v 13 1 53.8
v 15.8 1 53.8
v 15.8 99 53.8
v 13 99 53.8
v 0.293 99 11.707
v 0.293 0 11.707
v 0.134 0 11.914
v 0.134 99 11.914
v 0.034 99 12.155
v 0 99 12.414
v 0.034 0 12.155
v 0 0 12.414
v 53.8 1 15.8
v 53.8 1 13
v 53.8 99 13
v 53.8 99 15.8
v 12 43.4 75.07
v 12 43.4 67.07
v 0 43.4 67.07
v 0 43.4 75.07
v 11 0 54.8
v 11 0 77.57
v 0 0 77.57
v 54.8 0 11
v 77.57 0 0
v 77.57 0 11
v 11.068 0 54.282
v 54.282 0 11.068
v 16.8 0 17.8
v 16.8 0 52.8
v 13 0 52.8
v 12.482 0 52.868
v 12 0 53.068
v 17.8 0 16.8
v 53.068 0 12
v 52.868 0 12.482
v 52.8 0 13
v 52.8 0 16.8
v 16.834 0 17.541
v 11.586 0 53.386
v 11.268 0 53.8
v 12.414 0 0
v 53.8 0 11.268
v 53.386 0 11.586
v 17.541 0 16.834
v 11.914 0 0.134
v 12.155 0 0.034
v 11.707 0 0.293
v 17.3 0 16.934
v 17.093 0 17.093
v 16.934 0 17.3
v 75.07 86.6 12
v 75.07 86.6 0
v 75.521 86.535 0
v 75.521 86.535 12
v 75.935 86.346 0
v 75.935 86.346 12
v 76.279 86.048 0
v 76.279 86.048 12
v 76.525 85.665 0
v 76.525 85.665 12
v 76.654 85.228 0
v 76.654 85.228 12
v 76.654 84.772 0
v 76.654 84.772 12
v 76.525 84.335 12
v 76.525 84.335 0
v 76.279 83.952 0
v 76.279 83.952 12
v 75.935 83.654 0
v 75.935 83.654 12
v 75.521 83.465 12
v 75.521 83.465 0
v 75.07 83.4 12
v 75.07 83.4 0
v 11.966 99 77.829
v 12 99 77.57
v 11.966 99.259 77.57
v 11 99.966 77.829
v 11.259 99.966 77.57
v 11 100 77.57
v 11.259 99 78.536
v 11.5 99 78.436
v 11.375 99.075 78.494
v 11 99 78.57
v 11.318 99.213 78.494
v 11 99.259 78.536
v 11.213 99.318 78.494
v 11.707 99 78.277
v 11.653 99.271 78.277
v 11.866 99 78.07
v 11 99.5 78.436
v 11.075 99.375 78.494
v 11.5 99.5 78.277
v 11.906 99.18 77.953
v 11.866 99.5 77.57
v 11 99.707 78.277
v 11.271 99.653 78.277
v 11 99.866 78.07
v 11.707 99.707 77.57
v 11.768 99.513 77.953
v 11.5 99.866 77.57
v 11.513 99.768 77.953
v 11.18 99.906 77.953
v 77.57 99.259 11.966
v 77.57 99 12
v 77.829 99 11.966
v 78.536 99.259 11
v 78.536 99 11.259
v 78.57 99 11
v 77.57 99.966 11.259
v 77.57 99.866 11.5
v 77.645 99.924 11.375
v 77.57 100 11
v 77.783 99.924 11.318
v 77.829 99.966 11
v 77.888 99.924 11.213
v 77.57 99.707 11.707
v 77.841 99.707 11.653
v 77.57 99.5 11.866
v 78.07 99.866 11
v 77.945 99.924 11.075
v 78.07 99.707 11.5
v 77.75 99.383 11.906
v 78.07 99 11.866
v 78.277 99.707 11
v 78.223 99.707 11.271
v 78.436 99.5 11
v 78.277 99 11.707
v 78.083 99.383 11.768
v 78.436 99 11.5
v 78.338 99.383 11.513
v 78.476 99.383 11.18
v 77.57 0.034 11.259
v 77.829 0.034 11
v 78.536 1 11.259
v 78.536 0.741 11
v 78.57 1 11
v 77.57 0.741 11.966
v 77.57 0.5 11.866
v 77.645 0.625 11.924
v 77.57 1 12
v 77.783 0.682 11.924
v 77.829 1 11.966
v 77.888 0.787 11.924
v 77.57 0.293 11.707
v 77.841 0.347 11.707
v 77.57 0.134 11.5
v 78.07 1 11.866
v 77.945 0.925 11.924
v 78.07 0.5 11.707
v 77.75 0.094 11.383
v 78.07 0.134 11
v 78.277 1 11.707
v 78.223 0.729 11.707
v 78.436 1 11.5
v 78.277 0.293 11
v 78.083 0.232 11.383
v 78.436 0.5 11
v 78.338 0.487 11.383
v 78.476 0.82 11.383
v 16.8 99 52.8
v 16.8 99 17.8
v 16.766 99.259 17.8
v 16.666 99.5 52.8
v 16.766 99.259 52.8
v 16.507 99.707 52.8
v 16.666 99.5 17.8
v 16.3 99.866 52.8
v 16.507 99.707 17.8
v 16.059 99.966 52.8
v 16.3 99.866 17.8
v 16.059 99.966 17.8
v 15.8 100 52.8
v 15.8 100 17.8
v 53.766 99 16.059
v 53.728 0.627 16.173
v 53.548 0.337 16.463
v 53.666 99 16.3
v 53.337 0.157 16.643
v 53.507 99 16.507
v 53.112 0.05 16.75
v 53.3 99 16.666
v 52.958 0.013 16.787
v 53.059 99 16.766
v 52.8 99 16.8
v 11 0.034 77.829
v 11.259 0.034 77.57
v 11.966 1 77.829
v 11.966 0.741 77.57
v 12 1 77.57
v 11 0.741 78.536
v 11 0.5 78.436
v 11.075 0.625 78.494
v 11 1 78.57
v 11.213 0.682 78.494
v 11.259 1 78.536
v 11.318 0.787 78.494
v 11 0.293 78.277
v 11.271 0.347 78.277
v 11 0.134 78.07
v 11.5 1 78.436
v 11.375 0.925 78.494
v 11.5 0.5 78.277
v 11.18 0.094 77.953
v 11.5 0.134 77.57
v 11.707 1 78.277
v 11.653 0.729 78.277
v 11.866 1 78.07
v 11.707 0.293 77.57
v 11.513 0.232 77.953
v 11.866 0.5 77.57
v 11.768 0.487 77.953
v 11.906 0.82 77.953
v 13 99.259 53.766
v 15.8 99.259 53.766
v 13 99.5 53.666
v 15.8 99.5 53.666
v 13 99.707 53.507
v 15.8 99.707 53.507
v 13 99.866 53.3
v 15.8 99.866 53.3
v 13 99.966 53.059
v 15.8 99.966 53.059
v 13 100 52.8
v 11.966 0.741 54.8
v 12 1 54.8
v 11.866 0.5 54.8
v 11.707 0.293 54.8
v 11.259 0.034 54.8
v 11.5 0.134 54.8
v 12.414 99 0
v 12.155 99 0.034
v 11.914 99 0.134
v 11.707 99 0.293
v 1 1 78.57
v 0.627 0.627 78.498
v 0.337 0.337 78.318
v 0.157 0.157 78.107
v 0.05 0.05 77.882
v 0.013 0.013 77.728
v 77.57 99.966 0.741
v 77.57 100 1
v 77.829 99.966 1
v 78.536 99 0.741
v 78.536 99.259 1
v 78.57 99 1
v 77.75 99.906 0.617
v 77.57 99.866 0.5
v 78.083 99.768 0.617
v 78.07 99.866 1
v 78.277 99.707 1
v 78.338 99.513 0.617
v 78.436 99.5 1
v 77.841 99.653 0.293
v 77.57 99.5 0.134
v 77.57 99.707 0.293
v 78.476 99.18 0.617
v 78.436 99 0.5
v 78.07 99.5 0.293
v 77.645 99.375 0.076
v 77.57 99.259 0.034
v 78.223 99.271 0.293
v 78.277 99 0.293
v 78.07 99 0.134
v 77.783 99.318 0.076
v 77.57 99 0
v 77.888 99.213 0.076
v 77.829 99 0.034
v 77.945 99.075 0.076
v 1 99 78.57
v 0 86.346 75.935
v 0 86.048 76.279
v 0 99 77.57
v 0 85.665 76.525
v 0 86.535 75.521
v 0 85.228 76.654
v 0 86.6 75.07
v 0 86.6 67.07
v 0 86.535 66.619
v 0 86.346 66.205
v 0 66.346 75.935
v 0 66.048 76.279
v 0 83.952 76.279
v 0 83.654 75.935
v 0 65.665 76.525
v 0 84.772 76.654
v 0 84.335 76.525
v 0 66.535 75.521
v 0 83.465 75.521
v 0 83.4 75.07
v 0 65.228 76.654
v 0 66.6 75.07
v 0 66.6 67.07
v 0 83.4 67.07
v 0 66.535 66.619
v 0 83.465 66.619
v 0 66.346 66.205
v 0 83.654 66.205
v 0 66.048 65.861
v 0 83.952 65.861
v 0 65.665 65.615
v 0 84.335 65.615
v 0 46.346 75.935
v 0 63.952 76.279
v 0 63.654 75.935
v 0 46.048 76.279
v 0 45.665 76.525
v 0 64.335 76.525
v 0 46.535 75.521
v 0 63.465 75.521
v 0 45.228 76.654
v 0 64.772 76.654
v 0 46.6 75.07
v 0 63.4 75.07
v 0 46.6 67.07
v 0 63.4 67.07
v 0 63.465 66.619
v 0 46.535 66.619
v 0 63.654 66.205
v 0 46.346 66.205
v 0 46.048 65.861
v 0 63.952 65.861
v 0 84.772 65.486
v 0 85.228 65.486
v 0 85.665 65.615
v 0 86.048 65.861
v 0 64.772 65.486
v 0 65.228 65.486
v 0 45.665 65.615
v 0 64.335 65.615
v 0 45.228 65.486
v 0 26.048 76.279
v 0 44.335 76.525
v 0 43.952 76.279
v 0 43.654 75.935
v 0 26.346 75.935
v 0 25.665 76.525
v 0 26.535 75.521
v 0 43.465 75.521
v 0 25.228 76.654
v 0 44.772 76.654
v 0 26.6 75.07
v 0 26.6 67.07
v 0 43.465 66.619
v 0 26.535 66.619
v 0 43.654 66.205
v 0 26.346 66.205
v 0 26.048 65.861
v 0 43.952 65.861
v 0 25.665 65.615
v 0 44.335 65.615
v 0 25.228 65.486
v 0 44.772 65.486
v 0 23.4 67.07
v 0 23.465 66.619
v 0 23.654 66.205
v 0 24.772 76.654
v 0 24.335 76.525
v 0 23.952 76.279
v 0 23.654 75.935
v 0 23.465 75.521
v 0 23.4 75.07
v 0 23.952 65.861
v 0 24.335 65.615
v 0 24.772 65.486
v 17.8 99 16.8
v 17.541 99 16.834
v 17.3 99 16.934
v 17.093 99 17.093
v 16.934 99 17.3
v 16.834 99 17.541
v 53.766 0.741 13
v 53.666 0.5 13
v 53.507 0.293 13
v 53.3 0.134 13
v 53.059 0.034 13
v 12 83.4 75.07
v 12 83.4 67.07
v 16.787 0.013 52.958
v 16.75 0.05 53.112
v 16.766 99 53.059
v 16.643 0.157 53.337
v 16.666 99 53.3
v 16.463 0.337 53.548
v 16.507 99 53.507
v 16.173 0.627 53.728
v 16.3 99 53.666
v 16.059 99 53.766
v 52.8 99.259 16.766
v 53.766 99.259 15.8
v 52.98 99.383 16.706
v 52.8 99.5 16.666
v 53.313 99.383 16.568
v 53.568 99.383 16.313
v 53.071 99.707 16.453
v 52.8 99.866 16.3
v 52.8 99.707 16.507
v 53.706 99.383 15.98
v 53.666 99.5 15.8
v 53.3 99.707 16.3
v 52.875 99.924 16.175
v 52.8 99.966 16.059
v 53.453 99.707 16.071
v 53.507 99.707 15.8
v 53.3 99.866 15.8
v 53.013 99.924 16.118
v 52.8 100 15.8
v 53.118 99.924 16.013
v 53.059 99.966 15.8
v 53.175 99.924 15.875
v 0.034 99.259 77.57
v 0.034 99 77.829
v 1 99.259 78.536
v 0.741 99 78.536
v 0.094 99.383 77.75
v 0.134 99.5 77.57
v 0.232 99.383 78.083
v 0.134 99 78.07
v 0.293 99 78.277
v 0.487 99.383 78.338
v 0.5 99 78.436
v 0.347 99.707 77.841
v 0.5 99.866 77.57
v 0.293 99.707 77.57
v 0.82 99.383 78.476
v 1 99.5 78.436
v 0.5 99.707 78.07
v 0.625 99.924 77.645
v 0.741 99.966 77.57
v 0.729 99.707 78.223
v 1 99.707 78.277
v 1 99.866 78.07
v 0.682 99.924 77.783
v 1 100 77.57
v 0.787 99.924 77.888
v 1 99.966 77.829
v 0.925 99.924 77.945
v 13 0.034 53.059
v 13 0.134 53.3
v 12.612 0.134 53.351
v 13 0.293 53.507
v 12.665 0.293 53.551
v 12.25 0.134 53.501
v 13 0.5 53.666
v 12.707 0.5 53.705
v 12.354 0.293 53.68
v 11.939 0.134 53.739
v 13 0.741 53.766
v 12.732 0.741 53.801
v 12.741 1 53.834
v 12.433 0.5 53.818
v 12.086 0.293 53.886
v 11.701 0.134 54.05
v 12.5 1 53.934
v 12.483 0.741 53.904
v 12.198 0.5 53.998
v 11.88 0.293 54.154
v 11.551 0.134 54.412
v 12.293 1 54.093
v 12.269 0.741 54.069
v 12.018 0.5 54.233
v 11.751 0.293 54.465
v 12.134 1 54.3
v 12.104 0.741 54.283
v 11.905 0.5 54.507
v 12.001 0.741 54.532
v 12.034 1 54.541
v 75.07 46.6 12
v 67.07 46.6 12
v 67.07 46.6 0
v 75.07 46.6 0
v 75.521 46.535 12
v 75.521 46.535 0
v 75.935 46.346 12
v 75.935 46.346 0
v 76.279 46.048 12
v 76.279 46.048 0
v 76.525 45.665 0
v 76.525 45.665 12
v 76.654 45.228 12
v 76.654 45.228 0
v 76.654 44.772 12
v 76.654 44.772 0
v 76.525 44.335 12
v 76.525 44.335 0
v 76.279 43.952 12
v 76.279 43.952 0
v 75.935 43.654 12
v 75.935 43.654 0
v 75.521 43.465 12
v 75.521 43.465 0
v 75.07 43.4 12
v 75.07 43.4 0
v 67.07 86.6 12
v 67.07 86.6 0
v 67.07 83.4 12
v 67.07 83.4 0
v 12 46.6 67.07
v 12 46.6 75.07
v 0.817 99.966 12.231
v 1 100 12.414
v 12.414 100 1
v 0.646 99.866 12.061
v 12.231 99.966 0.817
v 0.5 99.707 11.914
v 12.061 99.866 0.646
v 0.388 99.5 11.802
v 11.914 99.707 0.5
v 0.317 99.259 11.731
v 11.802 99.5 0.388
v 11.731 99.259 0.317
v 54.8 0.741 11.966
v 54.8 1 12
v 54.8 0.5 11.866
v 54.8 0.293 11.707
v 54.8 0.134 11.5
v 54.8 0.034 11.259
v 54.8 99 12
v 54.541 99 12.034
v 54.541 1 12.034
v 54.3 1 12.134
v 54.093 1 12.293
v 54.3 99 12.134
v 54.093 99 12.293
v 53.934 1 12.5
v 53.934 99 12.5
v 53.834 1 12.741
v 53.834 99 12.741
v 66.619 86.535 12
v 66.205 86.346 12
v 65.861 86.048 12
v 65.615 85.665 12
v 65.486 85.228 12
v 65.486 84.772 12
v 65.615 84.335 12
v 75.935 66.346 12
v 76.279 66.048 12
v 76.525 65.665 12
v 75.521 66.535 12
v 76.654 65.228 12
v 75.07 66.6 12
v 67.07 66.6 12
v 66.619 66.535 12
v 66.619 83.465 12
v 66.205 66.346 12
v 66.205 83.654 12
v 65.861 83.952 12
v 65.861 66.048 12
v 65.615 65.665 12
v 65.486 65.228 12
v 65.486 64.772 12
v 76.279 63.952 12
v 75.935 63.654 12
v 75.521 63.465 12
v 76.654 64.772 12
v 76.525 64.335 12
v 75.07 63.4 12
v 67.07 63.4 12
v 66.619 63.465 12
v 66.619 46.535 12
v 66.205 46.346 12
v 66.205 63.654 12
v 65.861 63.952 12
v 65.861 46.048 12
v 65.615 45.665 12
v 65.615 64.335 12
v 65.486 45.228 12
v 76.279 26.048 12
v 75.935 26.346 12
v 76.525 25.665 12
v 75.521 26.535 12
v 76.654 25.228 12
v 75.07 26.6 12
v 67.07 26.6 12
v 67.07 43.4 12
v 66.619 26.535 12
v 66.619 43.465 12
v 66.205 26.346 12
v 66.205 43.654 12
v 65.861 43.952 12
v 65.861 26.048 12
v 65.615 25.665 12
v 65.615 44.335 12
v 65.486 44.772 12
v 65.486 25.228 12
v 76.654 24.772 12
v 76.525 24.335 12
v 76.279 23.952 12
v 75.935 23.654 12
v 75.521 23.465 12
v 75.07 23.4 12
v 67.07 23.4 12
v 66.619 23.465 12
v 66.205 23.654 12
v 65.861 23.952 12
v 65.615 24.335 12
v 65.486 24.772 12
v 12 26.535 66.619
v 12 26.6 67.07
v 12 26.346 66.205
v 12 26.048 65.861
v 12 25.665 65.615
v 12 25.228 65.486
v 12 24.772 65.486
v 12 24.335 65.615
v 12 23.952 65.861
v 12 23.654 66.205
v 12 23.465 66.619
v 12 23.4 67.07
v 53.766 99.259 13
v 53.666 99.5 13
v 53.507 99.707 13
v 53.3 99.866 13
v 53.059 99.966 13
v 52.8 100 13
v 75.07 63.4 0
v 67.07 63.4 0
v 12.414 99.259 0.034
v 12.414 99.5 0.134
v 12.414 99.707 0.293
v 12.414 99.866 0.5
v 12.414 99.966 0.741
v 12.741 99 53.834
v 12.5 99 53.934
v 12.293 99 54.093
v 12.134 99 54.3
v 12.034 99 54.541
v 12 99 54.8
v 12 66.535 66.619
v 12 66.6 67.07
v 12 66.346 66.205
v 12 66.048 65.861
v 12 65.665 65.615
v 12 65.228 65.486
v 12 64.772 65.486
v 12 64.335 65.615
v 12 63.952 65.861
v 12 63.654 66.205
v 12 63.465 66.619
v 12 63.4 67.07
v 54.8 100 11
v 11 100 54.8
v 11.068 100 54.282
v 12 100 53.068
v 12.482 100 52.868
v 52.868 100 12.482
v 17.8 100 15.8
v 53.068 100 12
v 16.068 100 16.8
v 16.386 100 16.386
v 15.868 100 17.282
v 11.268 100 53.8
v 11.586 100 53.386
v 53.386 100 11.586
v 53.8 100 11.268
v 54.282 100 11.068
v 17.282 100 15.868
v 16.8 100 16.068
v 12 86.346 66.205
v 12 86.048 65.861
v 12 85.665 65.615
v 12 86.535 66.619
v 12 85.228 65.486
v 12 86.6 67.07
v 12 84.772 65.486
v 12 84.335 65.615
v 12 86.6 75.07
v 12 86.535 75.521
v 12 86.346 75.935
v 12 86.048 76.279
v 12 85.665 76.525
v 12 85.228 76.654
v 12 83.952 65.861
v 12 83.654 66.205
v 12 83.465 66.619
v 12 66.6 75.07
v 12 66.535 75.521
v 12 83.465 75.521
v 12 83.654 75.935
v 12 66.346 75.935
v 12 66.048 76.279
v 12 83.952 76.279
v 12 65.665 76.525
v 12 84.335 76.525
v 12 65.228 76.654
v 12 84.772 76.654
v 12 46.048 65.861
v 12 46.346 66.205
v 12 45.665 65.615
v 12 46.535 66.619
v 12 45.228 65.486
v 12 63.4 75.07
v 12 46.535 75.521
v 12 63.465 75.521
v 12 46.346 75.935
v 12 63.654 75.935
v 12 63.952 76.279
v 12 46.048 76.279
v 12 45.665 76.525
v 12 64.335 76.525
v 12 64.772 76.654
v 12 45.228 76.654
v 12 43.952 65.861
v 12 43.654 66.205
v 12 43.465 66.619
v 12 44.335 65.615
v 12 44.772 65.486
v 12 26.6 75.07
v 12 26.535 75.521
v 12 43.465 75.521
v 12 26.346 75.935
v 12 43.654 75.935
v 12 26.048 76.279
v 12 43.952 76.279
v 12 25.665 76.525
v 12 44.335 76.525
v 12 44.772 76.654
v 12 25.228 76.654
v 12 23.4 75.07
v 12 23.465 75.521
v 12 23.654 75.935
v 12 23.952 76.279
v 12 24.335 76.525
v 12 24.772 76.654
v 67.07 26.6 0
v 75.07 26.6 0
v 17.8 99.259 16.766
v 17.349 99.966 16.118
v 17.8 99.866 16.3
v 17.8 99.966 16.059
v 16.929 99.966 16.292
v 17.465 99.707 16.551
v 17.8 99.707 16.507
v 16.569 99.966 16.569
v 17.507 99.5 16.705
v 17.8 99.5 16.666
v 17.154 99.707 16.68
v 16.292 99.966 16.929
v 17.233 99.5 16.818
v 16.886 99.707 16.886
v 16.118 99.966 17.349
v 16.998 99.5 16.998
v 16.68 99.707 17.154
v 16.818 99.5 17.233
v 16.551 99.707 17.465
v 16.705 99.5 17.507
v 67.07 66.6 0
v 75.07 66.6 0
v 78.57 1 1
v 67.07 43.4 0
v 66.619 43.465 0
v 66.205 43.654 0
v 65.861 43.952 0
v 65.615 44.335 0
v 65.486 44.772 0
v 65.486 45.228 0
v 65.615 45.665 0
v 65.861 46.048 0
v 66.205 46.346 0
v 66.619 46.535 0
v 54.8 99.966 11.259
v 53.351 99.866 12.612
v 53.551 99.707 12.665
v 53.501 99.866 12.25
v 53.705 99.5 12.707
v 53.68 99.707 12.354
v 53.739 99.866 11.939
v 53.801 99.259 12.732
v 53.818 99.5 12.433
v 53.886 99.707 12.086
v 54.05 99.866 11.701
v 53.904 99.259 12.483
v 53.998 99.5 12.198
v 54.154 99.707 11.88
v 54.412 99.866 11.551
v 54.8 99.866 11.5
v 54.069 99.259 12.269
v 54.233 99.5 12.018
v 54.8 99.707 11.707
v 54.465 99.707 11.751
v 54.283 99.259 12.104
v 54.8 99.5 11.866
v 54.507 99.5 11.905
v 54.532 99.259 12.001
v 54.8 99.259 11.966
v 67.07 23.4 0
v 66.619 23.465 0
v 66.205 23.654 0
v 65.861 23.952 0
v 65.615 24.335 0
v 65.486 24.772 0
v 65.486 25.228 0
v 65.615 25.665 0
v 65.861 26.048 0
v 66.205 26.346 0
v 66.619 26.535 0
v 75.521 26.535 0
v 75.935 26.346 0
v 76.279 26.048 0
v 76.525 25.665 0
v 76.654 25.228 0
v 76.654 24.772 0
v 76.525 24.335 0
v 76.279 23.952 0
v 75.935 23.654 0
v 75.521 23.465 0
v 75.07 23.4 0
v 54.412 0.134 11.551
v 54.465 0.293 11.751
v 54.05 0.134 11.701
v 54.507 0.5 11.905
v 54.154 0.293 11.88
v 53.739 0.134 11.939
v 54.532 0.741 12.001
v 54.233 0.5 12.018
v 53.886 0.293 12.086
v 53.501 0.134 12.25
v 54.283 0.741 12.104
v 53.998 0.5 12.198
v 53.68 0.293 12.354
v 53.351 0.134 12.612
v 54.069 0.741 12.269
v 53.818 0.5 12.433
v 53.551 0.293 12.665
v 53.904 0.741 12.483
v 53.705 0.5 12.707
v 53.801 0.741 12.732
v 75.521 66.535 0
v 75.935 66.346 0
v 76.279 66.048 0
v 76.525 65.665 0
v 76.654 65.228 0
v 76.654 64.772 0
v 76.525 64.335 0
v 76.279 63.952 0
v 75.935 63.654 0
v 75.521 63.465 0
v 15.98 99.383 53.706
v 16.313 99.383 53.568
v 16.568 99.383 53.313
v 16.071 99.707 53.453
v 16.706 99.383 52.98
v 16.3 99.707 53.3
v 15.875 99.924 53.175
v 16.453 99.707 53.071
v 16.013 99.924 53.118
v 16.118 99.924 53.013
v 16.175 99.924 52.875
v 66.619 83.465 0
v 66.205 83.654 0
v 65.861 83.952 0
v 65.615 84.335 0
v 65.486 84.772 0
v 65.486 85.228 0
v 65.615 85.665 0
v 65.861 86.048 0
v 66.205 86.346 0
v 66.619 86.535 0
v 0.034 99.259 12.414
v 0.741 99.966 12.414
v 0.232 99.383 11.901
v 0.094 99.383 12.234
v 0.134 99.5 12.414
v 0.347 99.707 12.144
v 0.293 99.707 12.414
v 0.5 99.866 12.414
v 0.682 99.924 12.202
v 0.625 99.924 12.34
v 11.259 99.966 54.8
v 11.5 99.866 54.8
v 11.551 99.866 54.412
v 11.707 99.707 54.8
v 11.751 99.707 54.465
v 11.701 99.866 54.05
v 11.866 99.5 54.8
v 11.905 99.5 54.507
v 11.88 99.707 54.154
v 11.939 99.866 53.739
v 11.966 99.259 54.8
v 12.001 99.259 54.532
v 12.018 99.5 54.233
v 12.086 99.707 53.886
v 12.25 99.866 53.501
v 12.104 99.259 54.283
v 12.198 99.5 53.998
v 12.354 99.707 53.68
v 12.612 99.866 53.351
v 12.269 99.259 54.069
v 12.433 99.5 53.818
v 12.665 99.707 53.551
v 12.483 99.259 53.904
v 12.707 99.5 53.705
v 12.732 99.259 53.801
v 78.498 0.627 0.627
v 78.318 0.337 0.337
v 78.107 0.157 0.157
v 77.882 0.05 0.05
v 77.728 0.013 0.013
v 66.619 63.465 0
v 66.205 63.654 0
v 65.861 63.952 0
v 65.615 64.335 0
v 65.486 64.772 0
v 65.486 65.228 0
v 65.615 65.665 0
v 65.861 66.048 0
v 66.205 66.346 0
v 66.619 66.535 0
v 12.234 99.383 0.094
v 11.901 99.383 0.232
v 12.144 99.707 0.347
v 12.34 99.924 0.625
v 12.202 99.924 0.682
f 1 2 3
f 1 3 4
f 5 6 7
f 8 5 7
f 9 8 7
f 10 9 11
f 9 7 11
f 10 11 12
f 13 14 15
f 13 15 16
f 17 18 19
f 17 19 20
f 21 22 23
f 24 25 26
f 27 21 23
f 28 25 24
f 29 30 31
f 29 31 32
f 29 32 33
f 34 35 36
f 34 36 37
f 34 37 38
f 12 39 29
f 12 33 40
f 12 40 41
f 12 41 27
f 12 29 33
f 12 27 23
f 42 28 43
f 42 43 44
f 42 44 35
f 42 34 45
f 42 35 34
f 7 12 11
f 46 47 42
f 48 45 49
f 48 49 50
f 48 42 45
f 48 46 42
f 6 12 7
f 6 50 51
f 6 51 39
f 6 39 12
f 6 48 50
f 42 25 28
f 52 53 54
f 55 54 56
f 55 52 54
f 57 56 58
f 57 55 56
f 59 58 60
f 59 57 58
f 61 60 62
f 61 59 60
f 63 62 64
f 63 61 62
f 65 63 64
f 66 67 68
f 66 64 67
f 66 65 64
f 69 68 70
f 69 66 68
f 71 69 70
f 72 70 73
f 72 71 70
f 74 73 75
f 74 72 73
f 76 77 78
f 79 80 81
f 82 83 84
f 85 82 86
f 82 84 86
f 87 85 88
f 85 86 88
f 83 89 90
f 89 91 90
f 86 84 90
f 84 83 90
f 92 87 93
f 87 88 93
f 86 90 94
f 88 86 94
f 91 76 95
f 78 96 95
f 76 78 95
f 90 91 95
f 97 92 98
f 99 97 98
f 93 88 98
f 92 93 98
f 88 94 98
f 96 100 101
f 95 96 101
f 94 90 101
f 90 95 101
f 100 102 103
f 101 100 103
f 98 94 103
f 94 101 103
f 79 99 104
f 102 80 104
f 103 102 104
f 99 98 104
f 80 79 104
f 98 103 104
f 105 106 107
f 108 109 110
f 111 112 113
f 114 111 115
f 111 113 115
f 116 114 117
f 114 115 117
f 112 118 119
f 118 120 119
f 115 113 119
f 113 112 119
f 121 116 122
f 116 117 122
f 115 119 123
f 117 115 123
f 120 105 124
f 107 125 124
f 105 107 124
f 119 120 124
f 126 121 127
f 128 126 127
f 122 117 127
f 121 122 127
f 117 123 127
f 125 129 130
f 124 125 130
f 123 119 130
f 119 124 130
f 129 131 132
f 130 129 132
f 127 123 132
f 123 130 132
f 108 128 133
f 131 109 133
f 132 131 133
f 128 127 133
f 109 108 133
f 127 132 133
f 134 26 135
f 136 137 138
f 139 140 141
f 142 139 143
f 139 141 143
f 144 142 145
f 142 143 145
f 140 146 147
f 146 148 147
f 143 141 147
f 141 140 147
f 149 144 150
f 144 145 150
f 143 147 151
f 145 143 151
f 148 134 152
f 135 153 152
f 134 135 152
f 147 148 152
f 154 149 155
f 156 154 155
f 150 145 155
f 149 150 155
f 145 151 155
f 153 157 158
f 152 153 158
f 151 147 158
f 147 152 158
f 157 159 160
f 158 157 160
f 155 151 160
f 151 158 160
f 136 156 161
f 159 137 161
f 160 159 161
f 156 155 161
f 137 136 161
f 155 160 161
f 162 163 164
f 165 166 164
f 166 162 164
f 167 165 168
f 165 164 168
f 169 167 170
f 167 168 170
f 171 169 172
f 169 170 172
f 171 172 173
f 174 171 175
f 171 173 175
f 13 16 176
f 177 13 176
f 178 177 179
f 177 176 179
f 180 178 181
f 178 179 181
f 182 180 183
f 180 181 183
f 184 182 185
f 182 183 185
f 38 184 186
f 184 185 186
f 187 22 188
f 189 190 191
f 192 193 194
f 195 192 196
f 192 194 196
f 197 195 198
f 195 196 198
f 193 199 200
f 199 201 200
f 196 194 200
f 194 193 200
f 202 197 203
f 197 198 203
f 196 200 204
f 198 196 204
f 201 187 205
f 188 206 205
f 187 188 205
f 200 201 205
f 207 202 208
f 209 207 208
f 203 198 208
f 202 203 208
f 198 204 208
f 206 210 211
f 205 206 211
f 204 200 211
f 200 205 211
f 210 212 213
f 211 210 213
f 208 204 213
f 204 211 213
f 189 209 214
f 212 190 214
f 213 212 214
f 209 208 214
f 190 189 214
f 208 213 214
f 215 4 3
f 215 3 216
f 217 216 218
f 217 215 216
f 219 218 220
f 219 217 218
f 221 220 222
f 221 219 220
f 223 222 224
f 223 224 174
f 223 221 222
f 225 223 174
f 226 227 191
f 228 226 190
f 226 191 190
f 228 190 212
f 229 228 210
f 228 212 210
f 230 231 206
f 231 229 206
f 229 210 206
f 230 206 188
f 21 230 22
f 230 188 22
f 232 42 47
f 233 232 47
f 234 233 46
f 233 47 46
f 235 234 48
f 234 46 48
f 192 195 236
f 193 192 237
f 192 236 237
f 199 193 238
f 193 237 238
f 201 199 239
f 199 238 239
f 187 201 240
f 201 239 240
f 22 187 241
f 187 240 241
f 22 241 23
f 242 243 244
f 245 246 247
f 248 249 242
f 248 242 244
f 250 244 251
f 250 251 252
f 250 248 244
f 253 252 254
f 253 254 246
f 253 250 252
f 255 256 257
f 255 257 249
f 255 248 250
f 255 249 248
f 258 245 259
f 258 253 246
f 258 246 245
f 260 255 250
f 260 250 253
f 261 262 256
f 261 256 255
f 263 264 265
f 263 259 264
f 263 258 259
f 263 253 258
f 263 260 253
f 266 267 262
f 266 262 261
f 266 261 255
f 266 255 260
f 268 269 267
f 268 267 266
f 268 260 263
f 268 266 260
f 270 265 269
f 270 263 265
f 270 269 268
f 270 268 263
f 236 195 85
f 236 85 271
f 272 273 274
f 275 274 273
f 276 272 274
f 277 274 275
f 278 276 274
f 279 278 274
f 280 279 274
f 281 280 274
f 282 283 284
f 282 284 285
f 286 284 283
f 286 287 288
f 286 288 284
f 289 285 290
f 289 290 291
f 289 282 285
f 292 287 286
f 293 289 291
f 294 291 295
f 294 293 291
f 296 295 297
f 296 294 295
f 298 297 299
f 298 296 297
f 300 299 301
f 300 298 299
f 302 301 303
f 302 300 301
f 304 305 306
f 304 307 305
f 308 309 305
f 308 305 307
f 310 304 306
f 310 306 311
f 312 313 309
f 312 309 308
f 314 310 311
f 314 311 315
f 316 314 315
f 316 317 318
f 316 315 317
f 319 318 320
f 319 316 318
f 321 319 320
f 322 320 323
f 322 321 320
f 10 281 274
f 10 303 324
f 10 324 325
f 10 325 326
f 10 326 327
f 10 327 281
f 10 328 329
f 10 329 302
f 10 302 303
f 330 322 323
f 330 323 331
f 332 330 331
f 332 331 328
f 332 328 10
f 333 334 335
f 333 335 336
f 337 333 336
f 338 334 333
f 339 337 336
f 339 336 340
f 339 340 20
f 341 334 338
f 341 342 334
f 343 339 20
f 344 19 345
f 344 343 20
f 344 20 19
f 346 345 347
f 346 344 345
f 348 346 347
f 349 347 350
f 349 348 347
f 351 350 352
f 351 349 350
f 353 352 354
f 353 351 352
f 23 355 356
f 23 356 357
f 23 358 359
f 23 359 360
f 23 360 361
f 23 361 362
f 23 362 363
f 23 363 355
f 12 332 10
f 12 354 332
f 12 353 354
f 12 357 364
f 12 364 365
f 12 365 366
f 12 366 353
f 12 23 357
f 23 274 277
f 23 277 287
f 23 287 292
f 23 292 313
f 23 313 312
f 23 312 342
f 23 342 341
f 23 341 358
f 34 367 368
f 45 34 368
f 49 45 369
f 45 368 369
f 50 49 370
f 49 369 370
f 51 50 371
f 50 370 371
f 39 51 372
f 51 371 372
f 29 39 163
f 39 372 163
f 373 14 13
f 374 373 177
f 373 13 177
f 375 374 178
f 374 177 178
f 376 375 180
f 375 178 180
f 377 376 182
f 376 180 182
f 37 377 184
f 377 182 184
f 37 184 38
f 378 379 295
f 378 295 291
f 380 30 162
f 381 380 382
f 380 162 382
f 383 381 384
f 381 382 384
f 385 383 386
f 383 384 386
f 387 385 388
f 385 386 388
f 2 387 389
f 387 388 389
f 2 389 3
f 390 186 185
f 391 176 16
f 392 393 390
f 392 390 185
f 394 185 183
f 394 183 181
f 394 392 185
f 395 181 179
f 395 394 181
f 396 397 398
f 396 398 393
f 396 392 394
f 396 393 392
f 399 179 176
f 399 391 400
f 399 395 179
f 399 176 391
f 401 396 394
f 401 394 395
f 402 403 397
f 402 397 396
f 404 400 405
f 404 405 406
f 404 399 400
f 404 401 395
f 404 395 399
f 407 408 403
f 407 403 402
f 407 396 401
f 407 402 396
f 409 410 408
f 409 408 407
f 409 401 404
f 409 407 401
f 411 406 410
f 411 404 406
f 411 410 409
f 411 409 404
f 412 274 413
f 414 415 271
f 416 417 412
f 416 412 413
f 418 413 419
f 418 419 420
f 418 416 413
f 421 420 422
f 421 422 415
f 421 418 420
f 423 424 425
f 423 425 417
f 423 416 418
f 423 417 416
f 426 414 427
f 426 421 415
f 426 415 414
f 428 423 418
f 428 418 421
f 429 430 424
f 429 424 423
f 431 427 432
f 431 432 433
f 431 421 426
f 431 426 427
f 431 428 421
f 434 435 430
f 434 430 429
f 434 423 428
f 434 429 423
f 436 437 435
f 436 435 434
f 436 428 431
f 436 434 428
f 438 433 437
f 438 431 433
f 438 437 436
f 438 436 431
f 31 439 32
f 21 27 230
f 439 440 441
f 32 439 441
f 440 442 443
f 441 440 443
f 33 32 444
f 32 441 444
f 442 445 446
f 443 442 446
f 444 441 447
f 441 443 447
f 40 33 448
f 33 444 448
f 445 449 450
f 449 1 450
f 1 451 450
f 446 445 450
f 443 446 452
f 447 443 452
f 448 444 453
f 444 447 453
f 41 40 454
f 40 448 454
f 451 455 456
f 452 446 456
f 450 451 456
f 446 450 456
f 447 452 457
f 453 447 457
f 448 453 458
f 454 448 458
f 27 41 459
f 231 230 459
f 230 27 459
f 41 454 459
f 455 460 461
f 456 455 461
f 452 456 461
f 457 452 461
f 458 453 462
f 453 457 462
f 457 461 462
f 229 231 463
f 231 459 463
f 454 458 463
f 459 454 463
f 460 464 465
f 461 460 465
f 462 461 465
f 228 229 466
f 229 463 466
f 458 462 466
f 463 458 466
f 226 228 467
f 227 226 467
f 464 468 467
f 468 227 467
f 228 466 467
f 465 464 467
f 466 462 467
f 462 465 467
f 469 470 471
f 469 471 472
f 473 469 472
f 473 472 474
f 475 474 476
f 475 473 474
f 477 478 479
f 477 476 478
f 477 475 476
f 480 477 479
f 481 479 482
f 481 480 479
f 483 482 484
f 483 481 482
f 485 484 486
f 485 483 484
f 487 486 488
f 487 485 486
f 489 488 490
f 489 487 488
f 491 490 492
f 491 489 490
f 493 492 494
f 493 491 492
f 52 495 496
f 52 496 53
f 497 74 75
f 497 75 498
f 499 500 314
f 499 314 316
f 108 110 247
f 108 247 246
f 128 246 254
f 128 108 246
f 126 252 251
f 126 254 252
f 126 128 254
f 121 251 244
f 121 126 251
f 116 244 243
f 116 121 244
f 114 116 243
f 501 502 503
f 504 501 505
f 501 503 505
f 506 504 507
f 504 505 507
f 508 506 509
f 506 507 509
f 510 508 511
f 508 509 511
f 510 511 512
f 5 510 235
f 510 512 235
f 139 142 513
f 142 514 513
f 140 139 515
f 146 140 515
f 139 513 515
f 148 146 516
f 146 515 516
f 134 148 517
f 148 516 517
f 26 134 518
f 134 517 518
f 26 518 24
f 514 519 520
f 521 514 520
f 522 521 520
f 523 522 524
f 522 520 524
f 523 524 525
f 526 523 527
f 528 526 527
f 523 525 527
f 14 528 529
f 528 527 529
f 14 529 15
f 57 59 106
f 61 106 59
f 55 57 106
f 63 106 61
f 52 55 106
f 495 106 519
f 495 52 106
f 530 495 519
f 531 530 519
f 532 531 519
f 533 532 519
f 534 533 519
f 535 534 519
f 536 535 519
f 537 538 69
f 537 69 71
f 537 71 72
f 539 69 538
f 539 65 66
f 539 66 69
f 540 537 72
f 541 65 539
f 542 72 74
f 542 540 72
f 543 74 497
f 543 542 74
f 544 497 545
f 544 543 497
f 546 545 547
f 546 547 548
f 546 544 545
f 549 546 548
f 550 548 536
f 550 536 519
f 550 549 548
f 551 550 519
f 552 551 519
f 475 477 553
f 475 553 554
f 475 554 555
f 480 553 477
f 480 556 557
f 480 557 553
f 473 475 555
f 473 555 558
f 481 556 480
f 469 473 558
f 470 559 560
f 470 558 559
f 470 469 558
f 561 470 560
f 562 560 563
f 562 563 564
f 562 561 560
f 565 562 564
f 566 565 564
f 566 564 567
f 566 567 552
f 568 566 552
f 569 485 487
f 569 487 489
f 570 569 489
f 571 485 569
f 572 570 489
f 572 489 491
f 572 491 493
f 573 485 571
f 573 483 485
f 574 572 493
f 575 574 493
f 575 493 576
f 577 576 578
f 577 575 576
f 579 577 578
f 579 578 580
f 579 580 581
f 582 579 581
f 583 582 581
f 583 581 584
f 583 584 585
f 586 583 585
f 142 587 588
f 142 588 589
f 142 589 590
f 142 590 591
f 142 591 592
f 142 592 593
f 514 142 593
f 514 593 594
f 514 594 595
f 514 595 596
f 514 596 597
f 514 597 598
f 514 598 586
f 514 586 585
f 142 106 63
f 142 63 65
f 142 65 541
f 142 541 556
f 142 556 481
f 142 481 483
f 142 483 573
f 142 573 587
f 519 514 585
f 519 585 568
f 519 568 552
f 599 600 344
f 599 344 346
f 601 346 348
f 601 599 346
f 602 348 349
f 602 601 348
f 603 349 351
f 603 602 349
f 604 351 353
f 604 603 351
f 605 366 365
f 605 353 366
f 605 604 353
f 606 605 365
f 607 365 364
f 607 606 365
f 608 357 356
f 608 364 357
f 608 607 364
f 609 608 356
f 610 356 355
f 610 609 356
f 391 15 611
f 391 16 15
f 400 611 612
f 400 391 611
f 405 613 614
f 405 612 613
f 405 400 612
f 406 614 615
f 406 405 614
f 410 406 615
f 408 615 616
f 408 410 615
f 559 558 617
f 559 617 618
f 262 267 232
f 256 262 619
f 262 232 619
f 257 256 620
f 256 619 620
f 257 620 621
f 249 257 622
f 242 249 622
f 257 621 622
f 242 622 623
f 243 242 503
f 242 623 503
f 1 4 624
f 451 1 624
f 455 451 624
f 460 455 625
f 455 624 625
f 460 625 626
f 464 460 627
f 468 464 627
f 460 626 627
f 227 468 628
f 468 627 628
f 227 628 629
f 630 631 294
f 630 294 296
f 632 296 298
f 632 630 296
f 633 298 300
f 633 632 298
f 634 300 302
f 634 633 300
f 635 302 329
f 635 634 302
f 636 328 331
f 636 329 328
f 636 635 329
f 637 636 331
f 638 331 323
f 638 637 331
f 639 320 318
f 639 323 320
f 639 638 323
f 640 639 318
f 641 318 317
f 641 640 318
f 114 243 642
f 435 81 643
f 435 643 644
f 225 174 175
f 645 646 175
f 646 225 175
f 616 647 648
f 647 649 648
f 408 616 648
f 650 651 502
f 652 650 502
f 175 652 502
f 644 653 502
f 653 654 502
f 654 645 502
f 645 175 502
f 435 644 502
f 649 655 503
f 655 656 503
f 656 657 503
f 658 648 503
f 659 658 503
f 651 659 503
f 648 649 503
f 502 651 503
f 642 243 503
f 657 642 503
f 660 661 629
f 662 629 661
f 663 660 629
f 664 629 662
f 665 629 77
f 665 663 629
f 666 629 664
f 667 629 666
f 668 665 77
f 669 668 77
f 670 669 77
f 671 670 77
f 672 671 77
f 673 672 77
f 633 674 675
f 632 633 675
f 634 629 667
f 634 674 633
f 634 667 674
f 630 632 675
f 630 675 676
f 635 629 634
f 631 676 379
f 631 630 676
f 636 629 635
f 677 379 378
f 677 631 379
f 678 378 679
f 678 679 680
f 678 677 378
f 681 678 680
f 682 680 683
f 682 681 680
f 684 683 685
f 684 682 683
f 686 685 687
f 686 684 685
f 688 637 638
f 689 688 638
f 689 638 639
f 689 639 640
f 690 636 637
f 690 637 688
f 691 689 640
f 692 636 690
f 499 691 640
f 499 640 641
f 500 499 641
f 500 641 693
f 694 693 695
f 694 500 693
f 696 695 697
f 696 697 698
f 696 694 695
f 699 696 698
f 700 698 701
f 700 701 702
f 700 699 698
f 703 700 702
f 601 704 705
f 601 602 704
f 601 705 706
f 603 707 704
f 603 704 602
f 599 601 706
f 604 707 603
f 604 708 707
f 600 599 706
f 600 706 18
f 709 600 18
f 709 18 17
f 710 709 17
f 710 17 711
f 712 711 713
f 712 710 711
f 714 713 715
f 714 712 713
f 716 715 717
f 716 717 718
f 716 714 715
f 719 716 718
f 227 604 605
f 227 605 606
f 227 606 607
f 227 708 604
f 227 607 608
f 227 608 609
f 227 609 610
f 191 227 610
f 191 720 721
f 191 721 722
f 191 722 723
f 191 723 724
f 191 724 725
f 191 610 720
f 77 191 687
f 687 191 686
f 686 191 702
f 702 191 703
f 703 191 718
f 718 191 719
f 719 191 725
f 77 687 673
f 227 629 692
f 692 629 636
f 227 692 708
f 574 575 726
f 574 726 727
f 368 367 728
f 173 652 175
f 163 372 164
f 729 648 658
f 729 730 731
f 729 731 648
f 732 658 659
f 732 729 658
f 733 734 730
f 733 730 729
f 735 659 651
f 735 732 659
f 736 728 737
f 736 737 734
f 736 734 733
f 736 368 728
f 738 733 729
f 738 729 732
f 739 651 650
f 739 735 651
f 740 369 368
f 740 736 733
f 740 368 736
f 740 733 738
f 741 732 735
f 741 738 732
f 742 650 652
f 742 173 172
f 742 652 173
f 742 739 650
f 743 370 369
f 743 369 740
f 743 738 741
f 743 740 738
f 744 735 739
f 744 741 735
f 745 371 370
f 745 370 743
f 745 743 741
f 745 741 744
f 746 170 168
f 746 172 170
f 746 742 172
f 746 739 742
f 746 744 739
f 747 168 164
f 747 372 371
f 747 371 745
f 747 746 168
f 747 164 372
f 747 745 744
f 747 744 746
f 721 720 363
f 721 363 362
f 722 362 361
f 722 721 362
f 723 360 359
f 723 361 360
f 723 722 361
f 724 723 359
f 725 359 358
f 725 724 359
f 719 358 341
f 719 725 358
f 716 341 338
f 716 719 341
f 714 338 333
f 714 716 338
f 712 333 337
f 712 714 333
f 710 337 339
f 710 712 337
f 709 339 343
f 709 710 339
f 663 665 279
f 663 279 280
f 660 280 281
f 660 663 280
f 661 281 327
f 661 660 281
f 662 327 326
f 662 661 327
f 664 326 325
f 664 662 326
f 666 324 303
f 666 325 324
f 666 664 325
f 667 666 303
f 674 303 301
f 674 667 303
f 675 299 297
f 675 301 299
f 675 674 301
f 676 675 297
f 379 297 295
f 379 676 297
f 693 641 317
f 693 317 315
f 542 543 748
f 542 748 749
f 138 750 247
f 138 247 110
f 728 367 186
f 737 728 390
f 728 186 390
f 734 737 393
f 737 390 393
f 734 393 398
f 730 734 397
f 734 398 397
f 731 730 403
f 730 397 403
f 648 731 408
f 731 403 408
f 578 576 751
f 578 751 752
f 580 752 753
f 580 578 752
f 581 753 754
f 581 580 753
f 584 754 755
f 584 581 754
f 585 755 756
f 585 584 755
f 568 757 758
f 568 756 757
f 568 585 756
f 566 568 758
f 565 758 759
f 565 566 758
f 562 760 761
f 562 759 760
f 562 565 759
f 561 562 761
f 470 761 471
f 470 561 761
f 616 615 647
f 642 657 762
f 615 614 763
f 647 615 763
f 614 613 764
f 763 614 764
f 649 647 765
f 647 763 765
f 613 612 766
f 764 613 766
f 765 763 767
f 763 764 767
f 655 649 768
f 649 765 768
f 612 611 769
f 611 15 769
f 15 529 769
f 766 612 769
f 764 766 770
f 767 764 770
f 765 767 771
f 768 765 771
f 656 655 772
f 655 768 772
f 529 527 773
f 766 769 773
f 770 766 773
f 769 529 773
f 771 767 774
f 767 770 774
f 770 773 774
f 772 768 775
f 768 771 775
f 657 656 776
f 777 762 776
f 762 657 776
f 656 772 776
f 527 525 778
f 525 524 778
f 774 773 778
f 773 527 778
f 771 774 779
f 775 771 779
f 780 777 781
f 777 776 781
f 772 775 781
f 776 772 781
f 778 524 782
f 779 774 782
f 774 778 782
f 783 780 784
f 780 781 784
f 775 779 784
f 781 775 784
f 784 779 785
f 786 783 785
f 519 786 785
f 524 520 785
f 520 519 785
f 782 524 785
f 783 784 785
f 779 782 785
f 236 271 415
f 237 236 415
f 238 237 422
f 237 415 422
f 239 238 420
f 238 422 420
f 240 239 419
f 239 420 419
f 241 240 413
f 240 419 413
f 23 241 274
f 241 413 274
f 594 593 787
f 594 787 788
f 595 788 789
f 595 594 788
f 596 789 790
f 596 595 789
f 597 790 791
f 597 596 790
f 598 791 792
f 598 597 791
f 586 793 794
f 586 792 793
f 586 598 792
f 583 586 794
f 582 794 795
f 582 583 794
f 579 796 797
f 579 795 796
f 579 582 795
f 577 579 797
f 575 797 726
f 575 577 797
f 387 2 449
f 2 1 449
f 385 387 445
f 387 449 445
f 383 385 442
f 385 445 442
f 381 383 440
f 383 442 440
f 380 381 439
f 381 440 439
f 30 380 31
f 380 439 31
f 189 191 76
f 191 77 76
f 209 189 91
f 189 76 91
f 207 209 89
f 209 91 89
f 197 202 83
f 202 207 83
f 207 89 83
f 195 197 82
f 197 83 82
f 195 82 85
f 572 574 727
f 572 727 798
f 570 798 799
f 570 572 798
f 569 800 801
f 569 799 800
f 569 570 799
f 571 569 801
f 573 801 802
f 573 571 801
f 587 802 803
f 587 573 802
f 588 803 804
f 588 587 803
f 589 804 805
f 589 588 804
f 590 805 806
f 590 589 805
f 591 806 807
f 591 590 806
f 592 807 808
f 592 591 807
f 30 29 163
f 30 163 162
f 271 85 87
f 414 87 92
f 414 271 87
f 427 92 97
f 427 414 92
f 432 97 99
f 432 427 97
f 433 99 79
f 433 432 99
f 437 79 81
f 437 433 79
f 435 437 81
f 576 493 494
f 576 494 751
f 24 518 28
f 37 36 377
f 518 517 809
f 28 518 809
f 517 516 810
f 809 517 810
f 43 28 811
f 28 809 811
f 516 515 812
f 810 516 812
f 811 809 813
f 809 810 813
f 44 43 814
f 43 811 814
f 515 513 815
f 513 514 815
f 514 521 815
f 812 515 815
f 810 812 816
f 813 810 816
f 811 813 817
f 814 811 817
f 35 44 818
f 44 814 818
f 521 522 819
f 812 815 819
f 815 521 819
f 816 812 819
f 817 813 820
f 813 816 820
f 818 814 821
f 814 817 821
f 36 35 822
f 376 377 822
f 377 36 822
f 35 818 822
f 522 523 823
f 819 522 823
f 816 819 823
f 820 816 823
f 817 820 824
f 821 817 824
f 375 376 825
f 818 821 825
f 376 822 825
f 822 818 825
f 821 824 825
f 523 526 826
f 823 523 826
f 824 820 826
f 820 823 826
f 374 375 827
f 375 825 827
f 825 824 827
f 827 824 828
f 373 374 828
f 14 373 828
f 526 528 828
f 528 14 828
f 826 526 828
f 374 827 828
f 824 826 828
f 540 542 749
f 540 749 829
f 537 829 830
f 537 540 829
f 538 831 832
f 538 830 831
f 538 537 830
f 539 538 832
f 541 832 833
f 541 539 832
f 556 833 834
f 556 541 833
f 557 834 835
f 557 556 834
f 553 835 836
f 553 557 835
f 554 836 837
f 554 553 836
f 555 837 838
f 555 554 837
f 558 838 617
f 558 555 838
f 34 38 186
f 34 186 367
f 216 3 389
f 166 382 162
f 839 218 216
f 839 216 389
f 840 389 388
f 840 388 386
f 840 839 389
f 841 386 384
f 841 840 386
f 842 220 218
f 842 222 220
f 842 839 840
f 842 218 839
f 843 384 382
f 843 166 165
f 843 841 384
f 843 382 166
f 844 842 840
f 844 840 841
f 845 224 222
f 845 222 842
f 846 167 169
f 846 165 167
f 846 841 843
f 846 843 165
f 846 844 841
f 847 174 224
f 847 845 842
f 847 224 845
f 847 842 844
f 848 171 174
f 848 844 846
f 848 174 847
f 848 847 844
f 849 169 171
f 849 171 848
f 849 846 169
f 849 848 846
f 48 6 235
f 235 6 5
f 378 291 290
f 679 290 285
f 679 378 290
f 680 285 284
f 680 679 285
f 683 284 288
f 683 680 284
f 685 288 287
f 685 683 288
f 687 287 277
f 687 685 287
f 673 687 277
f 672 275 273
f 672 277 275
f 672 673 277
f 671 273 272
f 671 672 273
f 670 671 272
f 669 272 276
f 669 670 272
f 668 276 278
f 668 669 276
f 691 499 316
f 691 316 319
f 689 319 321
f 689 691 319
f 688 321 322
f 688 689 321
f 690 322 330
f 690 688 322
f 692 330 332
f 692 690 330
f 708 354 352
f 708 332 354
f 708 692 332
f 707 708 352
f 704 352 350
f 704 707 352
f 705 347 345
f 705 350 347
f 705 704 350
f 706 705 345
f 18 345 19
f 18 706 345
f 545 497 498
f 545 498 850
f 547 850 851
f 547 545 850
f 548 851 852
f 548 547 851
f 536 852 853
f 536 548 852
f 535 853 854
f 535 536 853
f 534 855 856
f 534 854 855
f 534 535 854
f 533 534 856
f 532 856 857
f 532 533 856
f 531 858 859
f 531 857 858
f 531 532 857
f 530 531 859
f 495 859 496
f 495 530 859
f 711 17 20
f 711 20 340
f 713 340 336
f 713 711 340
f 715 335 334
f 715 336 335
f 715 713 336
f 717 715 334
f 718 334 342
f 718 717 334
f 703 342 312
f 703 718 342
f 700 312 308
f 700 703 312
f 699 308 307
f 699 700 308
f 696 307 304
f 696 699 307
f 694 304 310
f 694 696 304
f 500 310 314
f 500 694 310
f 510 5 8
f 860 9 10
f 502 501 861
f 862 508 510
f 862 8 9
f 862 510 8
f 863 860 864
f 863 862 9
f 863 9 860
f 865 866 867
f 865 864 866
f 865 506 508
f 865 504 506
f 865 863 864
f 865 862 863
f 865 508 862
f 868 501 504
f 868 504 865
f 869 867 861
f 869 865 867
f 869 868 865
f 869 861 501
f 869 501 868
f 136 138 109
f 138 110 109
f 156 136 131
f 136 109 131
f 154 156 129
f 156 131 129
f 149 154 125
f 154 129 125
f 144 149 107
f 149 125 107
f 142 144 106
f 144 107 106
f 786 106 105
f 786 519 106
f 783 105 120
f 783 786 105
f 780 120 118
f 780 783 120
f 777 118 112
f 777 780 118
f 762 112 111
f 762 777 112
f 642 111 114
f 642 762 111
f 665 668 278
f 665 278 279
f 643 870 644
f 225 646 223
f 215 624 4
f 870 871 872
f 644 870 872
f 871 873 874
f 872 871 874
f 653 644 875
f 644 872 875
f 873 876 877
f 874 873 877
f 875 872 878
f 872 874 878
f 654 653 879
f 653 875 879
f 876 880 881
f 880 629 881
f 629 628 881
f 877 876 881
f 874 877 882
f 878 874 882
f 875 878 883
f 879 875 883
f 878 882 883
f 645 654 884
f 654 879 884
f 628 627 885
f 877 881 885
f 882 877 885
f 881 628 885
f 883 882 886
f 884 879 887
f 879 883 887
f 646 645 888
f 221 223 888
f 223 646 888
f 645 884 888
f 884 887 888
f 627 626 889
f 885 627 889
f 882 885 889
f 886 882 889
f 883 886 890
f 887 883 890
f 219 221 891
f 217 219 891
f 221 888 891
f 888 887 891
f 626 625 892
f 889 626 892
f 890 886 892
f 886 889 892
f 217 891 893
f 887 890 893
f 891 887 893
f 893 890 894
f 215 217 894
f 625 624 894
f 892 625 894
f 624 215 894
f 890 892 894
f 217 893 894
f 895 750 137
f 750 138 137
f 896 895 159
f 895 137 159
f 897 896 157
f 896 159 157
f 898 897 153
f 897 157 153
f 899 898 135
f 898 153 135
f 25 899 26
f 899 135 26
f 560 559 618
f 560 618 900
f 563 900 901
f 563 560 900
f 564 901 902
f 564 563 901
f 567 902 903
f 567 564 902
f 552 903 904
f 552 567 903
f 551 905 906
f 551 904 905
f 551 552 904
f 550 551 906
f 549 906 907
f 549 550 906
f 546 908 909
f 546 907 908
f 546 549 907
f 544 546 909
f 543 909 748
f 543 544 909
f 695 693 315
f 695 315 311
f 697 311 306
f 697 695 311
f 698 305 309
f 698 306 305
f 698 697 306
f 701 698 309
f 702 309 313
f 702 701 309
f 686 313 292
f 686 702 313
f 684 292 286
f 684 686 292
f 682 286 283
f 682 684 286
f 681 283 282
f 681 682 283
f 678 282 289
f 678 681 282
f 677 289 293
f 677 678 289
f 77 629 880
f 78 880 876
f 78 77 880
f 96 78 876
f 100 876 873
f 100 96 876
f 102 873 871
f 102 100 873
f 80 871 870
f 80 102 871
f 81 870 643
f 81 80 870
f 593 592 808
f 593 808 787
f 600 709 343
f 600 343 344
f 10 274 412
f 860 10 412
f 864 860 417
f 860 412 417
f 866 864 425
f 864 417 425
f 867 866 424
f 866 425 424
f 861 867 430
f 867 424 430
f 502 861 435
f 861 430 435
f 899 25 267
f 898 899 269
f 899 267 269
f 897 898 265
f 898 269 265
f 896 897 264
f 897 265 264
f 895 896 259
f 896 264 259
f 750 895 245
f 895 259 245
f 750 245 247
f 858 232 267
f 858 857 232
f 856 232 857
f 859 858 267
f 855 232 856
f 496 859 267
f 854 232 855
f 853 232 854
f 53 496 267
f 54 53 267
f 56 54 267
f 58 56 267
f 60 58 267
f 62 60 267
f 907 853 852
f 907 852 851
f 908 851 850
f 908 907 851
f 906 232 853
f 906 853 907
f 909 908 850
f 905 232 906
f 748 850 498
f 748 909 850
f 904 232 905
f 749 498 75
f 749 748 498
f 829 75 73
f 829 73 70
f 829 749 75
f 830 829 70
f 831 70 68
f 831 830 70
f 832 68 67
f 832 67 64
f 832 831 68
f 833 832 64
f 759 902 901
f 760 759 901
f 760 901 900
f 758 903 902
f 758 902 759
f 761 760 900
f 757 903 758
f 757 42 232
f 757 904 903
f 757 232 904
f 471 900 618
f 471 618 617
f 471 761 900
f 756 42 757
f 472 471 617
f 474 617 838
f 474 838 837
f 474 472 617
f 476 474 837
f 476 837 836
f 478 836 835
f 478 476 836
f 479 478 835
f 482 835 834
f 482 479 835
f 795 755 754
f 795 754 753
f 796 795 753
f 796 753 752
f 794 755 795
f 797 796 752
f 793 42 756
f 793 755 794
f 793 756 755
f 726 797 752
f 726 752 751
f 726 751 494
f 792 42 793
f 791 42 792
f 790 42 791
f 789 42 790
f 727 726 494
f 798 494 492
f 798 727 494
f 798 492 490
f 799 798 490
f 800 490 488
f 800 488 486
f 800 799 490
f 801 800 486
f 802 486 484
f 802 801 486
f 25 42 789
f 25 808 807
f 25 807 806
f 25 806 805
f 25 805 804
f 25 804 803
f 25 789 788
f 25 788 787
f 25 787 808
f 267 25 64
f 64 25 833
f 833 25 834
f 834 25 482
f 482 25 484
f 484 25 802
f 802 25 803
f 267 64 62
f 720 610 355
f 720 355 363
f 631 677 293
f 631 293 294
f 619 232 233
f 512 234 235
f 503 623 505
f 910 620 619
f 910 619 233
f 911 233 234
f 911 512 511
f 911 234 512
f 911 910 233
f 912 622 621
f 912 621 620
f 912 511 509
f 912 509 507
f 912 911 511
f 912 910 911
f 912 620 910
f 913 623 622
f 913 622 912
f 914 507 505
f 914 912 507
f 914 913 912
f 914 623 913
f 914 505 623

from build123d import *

# Parameters (mm, degrees)
BOSS_EXTRUDE1_DEPTH = 100
FILLET1_R           = 1
CHAMFER1_SIZE       = 12
FILLET2_R           = 1
CUT_EXTRUDE1_DEPTH  = 100
CUT_EXTRUDE2_DEPTH  = 100


with BuildPart() as part:
    # Sketch1 → Boss-Extrude1 (new body)
    with BuildSketch(Plane(origin=(0, 0, 0), x_dir=(1, 0, 0), z_dir=(0, 1, 0))):
        Polygon((0, 0), (78.57, 0), (78.57, -12), (53.8, -12), (53.8, -16.8), (16.8, -16.8), (16.8, -53.8), (12, -53.8), (12, -78.57), (0, -78.57), align=None)
    extrude(amount=BOSS_EXTRUDE1_DEPTH)

    # Fillet1
    fillet1_edges = [part.edges().sort_by_distance(p)[0] for p in [
        (78.57, 0, 6),
        (66.185, 0, 12),
        (53.8, 0, 14.4),
        (14.4, 0, 53.8),
        (12, 100, 66.185),
        (12, 0, 66.185),
        (6, 0, 78.57),
        (14.4, 100, 53.8),
        (78.57, 50, 0),
        (78.57, 50, 12),
        (53.8, 50, 12),
        (53.8, 50, 16.8),
        (16.8, 50, 16.8),
        (16.8, 50, 53.8),
        (12, 50, 53.8),
        (12, 50, 78.57),
        (0, 50, 78.57),
        (53.8, 100, 14.4),
        (66.185, 100, 12),
        (78.57, 100, 6),
        (6, 100, 78.57),
    ]]
    fillet(fillet1_edges, radius=FILLET1_R)

    # Chamfer1
    chamfer1_edges = [part.edges().sort_by_distance(p)[0] for p in [
        (0, 50, 0),
    ]]
    chamfer(chamfer1_edges, length=CHAMFER1_SIZE)

    # Fillet2
    # the kernel refuses this fillet: 1 mm, written as the material it takes off along each edge
    with BuildSketch(Plane(origin=(1, 99, 77.57), x_dir=(-1, 0, 0), z_dir=(0, 1, 0))) as fillet2_piece_1_section:
        Polygon((0, 0), (FILLET2_R, 0), (FILLET2_R, FILLET2_R), (0, FILLET2_R), align=None)
    fillet2_piece_1 = extrude(amount=FILLET2_R, mode=Mode.PRIVATE)
    fillet2_piece_1 = fillet2_piece_1 - Plane(origin=(1, 99, 77.57), x_dir=(0.7071067811865475, 0, -0.7071067811865477), z_dir=(0, 1, 0)) * Sphere(FILLET2_R, mode=Mode.PRIVATE)
    add(fillet2_piece_1, mode=Mode.SUBTRACT)
    with BuildSketch(Plane(origin=(15.8, 99, 52.8), x_dir=(1, 0, 0), z_dir=(0, 1, 0))) as fillet2_piece_2_section:
        Polygon((0, 0), (FILLET2_R, 0), (FILLET2_R, -FILLET2_R), (0, -FILLET2_R), align=None)
    fillet2_piece_2 = extrude(amount=FILLET2_R, mode=Mode.PRIVATE)
    fillet2_piece_2 = fillet2_piece_2 - Plane(origin=(15.8, 99, 52.8), x_dir=(-0.7071067811865476, 0, -0.7071067811865474), z_dir=(0, 1, 0)) * Sphere(FILLET2_R, mode=Mode.PRIVATE)
    add(fillet2_piece_2, mode=Mode.SUBTRACT)
    with BuildSketch(Plane(origin=(52.8, 99, 15.8), x_dir=(0, 0, 1), z_dir=(0, 1, 0))) as fillet2_piece_3_section:
        Polygon((0, 0), (FILLET2_R, 0), (FILLET2_R, FILLET2_R), (0, FILLET2_R), align=None)
    fillet2_piece_3 = extrude(amount=FILLET2_R, mode=Mode.PRIVATE)
    fillet2_piece_3 = fillet2_piece_3 - Plane(origin=(52.8, 99, 15.8), x_dir=(-0.7071067811865475, 0, -0.7071067811865475), z_dir=(0, 1, 0)) * Sphere(FILLET2_R, mode=Mode.PRIVATE)
    add(fillet2_piece_3, mode=Mode.SUBTRACT)
    with BuildSketch(Plane(origin=(77.57, 99, 1), x_dir=(0, 1, 0), z_dir=(0, 0, -1))) as fillet2_piece_4_section:
        Polygon((0, 0), (FILLET2_R, 0), (FILLET2_R, FILLET2_R), (0, FILLET2_R), align=None)
    fillet2_piece_4 = extrude(amount=FILLET2_R, mode=Mode.PRIVATE)
    fillet2_piece_4 = fillet2_piece_4 - Plane(origin=(77.57, 99, 1), x_dir=(-0.7071067811865475, -0.7071067811865475, 0), z_dir=(0, 0, -1)) * Sphere(FILLET2_R, mode=Mode.PRIVATE)
    add(fillet2_piece_4, mode=Mode.SUBTRACT)
    with BuildSketch(Plane(origin=(1, 99, 12.414213562), x_dir=(-1, 0, 0), z_dir=(0, 1, 0))) as fillet2_piece_5_section:
        Polygon((0, 0), (FILLET2_R, 0), (FILLET2_R, -FILLET2_R * 0.414213562373), (FILLET2_R * 0.707106781187, -FILLET2_R * 0.707106781187), align=None)
    fillet2_piece_5 = extrude(amount=FILLET2_R, mode=Mode.PRIVATE)
    fillet2_piece_5 = fillet2_piece_5 - Plane(origin=(1, 99, 12.414213562), x_dir=(0.9238795325112868, 0, 0.3826834323650896), z_dir=(0, 1, 0)) * Sphere(FILLET2_R, mode=Mode.PRIVATE)
    add(fillet2_piece_5, mode=Mode.SUBTRACT)
    with BuildSketch(Plane(origin=(12.414213562, 99, 1), x_dir=(0, 0, -1), z_dir=(0, 1, 0))) as fillet2_piece_6_section:
        Polygon((0, 0), (FILLET2_R, 0), (FILLET2_R, FILLET2_R * 0.414213562373), (FILLET2_R * 0.707106781187, FILLET2_R * 0.707106781187), align=None)
    fillet2_piece_6 = extrude(amount=FILLET2_R, mode=Mode.PRIVATE)
    fillet2_piece_6 = fillet2_piece_6 - Plane(origin=(12.414213562, 99, 1), x_dir=(0.3826834323650898, 0, 0.9238795325112867), z_dir=(0, 1, 0)) * Sphere(FILLET2_R, mode=Mode.PRIVATE)
    add(fillet2_piece_6, mode=Mode.SUBTRACT)
    with BuildSketch(Plane(origin=(0, 100, 77.57), x_dir=(1, 0, 0), z_dir=(0, 0, -1))) as fillet2_piece_7:
        with BuildLine():
            CenterArc((FILLET2_R, FILLET2_R), FILLET2_R, 180, 90)
            Line((0, FILLET2_R), (0, 0))
            Line((0, 0), (FILLET2_R, 0))
        make_face()
    extrude(amount=65.155786438, mode=Mode.SUBTRACT)
    with BuildSketch(Plane(origin=(0, -1.035533906, 12), x_dir=(0.7071067811865466, 0, -0.7071067811865485), z_dir=(0, 1, 0)), Plane(origin=(12, -1.035533906, 0), x_dir=(1, 0, 0), z_dir=(0, 1, 0))) as fillet2_piece_8:
        with BuildLine():
            CenterArc((FILLET2_R * 0.414213562373, -FILLET2_R), FILLET2_R, 90, 45)
            Line((-FILLET2_R * 0.292893218813, -FILLET2_R * 0.292893218813), (0, 0))
            Line((0, 0), (FILLET2_R * 0.414213562373, 0))
        make_face()
    extrude(amount=100.035533906, mode=Mode.SUBTRACT)
    with BuildSketch(Plane(origin=(11.707106781, 100, 0.292893219), x_dir=(0, -1, 0), z_dir=(-0.7071067811865475, 0, 0.7071067811865476))) as fillet2_piece_9:
        with BuildLine():
            CenterArc((FILLET2_R, FILLET2_R), FILLET2_R, 180, 90)
            Line((0, FILLET2_R), (0, 0))
            Line((0, 0), (FILLET2_R, 0))
        make_face()
    extrude(amount=16.142135624, mode=Mode.SUBTRACT)
    with BuildSketch(Plane(origin=(16.8, 100, 17.8), x_dir=(-1, 0, 0), z_dir=(0, 0, 1)), Plane(origin=(52.8, 100, 16.8), x_dir=(0, 0, -1), z_dir=(-1, 0, 0))) as fillet2_piece_10:
        with BuildLine():
            CenterArc((FILLET2_R, FILLET2_R), FILLET2_R, 180, 90)
            Line((0, FILLET2_R), (0, 0))
            Line((0, 0), (FILLET2_R, 0))
        make_face()
    extrude(amount=35, mode=Mode.SUBTRACT)
    with BuildSketch(Plane(origin=(12.414213562, 100, 0), x_dir=(0, -1, 0), z_dir=(1, 0, 0))) as fillet2_piece_11:
        with BuildLine():
            CenterArc((FILLET2_R, -FILLET2_R), FILLET2_R, 90, 90)
            Line((0, -FILLET2_R), (0, 0))
            Line((0, 0), (FILLET2_R, 0))
        make_face()
    extrude(amount=65.155786438, mode=Mode.SUBTRACT)
    with BuildSketch(Plane(origin=(17.8, 100, 17.8), x_dir=(0, 0, -1), z_dir=(1, 0, 0))) as fillet2_piece_12:
        with BuildLine():
            CenterArc((1 + FILLET2_R, -FILLET2_R), FILLET2_R, 90, 90)
            Line((1, -FILLET2_R), (1, 0))
            Line((1, 0), (1 + FILLET2_R, 0))
        make_face()
    revolve(axis=Axis((17.8, 100, 17.8), (0, 1, 0)), revolution_arc=90, mode=Mode.SUBTRACT)

    # Sketch2 → Cut-Extrude1 (cut)
    with BuildSketch(Plane(origin=(12, 0, 0), x_dir=(0, 0, -1), z_dir=(1, 0, 0))):
        with BuildLine():
            Line((-75.07, 86.6), (-67.07, 86.6))
            ThreePointArc((-67.07, 86.6), (-65.47, 85), (-67.07, 83.4))
            Line((-67.07, 83.4), (-75.07, 83.4))
            ThreePointArc((-75.07, 83.4), (-76.67, 85), (-75.07, 86.6))
        make_face()
        with BuildLine():
            Line((-75.07, 66.6), (-67.07, 66.6))
            ThreePointArc((-67.07, 66.6), (-65.47, 65), (-67.07, 63.4))
            Line((-67.07, 63.4), (-75.07, 63.4))
            ThreePointArc((-75.07, 63.4), (-76.67, 65), (-75.07, 66.6))
        make_face()
        with BuildLine():
            Line((-75.07, 46.6), (-67.07, 46.6))
            ThreePointArc((-67.07, 46.6), (-65.47, 45), (-67.07, 43.4))
            Line((-67.07, 43.4), (-75.07, 43.4))
            ThreePointArc((-75.07, 43.4), (-76.67, 45), (-75.07, 46.6))
        make_face()
        with BuildLine():
            Line((-75.07, 26.6), (-67.07, 26.6))
            ThreePointArc((-67.07, 26.6), (-65.47, 25), (-67.07, 23.4))
            Line((-67.07, 23.4), (-75.07, 23.4))
            ThreePointArc((-75.07, 23.4), (-76.67, 25), (-75.07, 26.6))
        make_face()
    extrude(amount=-CUT_EXTRUDE1_DEPTH, mode=Mode.SUBTRACT)

    # Sketch3 → Cut-Extrude2 (cut)
    with BuildSketch(Plane.XY.offset(12)):
        with BuildLine():
            Line((67.07, 86.6), (75.07, 86.6))
            ThreePointArc((75.07, 86.6), (76.67, 85), (75.07, 83.4))
            Line((75.07, 83.4), (67.07, 83.4))
            ThreePointArc((67.07, 83.4), (65.47, 85), (67.07, 86.6))
        make_face()
        with BuildLine():
            Line((67.07, 66.6), (75.07, 66.6))
            ThreePointArc((75.07, 66.6), (76.67, 65), (75.07, 63.4))
            Line((75.07, 63.4), (67.07, 63.4))
            ThreePointArc((67.07, 63.4), (65.47, 65), (67.07, 66.6))
        make_face()
        with BuildLine():
            Line((67.07, 46.6), (75.07, 46.6))
            ThreePointArc((75.07, 46.6), (76.67, 45), (75.07, 43.4))
            Line((75.07, 43.4), (67.07, 43.4))
            ThreePointArc((67.07, 43.4), (65.47, 45), (67.07, 46.6))
        make_face()
        with BuildLine():
            Line((67.07, 26.6), (75.07, 26.6))
            ThreePointArc((75.07, 26.6), (76.67, 25), (75.07, 23.4))
            Line((75.07, 23.4), (67.07, 23.4))
            ThreePointArc((67.07, 23.4), (65.47, 25), (67.07, 26.6))
        make_face()
    extrude(amount=-CUT_EXTRUDE2_DEPTH, mode=Mode.SUBTRACT)


solid = part.part
